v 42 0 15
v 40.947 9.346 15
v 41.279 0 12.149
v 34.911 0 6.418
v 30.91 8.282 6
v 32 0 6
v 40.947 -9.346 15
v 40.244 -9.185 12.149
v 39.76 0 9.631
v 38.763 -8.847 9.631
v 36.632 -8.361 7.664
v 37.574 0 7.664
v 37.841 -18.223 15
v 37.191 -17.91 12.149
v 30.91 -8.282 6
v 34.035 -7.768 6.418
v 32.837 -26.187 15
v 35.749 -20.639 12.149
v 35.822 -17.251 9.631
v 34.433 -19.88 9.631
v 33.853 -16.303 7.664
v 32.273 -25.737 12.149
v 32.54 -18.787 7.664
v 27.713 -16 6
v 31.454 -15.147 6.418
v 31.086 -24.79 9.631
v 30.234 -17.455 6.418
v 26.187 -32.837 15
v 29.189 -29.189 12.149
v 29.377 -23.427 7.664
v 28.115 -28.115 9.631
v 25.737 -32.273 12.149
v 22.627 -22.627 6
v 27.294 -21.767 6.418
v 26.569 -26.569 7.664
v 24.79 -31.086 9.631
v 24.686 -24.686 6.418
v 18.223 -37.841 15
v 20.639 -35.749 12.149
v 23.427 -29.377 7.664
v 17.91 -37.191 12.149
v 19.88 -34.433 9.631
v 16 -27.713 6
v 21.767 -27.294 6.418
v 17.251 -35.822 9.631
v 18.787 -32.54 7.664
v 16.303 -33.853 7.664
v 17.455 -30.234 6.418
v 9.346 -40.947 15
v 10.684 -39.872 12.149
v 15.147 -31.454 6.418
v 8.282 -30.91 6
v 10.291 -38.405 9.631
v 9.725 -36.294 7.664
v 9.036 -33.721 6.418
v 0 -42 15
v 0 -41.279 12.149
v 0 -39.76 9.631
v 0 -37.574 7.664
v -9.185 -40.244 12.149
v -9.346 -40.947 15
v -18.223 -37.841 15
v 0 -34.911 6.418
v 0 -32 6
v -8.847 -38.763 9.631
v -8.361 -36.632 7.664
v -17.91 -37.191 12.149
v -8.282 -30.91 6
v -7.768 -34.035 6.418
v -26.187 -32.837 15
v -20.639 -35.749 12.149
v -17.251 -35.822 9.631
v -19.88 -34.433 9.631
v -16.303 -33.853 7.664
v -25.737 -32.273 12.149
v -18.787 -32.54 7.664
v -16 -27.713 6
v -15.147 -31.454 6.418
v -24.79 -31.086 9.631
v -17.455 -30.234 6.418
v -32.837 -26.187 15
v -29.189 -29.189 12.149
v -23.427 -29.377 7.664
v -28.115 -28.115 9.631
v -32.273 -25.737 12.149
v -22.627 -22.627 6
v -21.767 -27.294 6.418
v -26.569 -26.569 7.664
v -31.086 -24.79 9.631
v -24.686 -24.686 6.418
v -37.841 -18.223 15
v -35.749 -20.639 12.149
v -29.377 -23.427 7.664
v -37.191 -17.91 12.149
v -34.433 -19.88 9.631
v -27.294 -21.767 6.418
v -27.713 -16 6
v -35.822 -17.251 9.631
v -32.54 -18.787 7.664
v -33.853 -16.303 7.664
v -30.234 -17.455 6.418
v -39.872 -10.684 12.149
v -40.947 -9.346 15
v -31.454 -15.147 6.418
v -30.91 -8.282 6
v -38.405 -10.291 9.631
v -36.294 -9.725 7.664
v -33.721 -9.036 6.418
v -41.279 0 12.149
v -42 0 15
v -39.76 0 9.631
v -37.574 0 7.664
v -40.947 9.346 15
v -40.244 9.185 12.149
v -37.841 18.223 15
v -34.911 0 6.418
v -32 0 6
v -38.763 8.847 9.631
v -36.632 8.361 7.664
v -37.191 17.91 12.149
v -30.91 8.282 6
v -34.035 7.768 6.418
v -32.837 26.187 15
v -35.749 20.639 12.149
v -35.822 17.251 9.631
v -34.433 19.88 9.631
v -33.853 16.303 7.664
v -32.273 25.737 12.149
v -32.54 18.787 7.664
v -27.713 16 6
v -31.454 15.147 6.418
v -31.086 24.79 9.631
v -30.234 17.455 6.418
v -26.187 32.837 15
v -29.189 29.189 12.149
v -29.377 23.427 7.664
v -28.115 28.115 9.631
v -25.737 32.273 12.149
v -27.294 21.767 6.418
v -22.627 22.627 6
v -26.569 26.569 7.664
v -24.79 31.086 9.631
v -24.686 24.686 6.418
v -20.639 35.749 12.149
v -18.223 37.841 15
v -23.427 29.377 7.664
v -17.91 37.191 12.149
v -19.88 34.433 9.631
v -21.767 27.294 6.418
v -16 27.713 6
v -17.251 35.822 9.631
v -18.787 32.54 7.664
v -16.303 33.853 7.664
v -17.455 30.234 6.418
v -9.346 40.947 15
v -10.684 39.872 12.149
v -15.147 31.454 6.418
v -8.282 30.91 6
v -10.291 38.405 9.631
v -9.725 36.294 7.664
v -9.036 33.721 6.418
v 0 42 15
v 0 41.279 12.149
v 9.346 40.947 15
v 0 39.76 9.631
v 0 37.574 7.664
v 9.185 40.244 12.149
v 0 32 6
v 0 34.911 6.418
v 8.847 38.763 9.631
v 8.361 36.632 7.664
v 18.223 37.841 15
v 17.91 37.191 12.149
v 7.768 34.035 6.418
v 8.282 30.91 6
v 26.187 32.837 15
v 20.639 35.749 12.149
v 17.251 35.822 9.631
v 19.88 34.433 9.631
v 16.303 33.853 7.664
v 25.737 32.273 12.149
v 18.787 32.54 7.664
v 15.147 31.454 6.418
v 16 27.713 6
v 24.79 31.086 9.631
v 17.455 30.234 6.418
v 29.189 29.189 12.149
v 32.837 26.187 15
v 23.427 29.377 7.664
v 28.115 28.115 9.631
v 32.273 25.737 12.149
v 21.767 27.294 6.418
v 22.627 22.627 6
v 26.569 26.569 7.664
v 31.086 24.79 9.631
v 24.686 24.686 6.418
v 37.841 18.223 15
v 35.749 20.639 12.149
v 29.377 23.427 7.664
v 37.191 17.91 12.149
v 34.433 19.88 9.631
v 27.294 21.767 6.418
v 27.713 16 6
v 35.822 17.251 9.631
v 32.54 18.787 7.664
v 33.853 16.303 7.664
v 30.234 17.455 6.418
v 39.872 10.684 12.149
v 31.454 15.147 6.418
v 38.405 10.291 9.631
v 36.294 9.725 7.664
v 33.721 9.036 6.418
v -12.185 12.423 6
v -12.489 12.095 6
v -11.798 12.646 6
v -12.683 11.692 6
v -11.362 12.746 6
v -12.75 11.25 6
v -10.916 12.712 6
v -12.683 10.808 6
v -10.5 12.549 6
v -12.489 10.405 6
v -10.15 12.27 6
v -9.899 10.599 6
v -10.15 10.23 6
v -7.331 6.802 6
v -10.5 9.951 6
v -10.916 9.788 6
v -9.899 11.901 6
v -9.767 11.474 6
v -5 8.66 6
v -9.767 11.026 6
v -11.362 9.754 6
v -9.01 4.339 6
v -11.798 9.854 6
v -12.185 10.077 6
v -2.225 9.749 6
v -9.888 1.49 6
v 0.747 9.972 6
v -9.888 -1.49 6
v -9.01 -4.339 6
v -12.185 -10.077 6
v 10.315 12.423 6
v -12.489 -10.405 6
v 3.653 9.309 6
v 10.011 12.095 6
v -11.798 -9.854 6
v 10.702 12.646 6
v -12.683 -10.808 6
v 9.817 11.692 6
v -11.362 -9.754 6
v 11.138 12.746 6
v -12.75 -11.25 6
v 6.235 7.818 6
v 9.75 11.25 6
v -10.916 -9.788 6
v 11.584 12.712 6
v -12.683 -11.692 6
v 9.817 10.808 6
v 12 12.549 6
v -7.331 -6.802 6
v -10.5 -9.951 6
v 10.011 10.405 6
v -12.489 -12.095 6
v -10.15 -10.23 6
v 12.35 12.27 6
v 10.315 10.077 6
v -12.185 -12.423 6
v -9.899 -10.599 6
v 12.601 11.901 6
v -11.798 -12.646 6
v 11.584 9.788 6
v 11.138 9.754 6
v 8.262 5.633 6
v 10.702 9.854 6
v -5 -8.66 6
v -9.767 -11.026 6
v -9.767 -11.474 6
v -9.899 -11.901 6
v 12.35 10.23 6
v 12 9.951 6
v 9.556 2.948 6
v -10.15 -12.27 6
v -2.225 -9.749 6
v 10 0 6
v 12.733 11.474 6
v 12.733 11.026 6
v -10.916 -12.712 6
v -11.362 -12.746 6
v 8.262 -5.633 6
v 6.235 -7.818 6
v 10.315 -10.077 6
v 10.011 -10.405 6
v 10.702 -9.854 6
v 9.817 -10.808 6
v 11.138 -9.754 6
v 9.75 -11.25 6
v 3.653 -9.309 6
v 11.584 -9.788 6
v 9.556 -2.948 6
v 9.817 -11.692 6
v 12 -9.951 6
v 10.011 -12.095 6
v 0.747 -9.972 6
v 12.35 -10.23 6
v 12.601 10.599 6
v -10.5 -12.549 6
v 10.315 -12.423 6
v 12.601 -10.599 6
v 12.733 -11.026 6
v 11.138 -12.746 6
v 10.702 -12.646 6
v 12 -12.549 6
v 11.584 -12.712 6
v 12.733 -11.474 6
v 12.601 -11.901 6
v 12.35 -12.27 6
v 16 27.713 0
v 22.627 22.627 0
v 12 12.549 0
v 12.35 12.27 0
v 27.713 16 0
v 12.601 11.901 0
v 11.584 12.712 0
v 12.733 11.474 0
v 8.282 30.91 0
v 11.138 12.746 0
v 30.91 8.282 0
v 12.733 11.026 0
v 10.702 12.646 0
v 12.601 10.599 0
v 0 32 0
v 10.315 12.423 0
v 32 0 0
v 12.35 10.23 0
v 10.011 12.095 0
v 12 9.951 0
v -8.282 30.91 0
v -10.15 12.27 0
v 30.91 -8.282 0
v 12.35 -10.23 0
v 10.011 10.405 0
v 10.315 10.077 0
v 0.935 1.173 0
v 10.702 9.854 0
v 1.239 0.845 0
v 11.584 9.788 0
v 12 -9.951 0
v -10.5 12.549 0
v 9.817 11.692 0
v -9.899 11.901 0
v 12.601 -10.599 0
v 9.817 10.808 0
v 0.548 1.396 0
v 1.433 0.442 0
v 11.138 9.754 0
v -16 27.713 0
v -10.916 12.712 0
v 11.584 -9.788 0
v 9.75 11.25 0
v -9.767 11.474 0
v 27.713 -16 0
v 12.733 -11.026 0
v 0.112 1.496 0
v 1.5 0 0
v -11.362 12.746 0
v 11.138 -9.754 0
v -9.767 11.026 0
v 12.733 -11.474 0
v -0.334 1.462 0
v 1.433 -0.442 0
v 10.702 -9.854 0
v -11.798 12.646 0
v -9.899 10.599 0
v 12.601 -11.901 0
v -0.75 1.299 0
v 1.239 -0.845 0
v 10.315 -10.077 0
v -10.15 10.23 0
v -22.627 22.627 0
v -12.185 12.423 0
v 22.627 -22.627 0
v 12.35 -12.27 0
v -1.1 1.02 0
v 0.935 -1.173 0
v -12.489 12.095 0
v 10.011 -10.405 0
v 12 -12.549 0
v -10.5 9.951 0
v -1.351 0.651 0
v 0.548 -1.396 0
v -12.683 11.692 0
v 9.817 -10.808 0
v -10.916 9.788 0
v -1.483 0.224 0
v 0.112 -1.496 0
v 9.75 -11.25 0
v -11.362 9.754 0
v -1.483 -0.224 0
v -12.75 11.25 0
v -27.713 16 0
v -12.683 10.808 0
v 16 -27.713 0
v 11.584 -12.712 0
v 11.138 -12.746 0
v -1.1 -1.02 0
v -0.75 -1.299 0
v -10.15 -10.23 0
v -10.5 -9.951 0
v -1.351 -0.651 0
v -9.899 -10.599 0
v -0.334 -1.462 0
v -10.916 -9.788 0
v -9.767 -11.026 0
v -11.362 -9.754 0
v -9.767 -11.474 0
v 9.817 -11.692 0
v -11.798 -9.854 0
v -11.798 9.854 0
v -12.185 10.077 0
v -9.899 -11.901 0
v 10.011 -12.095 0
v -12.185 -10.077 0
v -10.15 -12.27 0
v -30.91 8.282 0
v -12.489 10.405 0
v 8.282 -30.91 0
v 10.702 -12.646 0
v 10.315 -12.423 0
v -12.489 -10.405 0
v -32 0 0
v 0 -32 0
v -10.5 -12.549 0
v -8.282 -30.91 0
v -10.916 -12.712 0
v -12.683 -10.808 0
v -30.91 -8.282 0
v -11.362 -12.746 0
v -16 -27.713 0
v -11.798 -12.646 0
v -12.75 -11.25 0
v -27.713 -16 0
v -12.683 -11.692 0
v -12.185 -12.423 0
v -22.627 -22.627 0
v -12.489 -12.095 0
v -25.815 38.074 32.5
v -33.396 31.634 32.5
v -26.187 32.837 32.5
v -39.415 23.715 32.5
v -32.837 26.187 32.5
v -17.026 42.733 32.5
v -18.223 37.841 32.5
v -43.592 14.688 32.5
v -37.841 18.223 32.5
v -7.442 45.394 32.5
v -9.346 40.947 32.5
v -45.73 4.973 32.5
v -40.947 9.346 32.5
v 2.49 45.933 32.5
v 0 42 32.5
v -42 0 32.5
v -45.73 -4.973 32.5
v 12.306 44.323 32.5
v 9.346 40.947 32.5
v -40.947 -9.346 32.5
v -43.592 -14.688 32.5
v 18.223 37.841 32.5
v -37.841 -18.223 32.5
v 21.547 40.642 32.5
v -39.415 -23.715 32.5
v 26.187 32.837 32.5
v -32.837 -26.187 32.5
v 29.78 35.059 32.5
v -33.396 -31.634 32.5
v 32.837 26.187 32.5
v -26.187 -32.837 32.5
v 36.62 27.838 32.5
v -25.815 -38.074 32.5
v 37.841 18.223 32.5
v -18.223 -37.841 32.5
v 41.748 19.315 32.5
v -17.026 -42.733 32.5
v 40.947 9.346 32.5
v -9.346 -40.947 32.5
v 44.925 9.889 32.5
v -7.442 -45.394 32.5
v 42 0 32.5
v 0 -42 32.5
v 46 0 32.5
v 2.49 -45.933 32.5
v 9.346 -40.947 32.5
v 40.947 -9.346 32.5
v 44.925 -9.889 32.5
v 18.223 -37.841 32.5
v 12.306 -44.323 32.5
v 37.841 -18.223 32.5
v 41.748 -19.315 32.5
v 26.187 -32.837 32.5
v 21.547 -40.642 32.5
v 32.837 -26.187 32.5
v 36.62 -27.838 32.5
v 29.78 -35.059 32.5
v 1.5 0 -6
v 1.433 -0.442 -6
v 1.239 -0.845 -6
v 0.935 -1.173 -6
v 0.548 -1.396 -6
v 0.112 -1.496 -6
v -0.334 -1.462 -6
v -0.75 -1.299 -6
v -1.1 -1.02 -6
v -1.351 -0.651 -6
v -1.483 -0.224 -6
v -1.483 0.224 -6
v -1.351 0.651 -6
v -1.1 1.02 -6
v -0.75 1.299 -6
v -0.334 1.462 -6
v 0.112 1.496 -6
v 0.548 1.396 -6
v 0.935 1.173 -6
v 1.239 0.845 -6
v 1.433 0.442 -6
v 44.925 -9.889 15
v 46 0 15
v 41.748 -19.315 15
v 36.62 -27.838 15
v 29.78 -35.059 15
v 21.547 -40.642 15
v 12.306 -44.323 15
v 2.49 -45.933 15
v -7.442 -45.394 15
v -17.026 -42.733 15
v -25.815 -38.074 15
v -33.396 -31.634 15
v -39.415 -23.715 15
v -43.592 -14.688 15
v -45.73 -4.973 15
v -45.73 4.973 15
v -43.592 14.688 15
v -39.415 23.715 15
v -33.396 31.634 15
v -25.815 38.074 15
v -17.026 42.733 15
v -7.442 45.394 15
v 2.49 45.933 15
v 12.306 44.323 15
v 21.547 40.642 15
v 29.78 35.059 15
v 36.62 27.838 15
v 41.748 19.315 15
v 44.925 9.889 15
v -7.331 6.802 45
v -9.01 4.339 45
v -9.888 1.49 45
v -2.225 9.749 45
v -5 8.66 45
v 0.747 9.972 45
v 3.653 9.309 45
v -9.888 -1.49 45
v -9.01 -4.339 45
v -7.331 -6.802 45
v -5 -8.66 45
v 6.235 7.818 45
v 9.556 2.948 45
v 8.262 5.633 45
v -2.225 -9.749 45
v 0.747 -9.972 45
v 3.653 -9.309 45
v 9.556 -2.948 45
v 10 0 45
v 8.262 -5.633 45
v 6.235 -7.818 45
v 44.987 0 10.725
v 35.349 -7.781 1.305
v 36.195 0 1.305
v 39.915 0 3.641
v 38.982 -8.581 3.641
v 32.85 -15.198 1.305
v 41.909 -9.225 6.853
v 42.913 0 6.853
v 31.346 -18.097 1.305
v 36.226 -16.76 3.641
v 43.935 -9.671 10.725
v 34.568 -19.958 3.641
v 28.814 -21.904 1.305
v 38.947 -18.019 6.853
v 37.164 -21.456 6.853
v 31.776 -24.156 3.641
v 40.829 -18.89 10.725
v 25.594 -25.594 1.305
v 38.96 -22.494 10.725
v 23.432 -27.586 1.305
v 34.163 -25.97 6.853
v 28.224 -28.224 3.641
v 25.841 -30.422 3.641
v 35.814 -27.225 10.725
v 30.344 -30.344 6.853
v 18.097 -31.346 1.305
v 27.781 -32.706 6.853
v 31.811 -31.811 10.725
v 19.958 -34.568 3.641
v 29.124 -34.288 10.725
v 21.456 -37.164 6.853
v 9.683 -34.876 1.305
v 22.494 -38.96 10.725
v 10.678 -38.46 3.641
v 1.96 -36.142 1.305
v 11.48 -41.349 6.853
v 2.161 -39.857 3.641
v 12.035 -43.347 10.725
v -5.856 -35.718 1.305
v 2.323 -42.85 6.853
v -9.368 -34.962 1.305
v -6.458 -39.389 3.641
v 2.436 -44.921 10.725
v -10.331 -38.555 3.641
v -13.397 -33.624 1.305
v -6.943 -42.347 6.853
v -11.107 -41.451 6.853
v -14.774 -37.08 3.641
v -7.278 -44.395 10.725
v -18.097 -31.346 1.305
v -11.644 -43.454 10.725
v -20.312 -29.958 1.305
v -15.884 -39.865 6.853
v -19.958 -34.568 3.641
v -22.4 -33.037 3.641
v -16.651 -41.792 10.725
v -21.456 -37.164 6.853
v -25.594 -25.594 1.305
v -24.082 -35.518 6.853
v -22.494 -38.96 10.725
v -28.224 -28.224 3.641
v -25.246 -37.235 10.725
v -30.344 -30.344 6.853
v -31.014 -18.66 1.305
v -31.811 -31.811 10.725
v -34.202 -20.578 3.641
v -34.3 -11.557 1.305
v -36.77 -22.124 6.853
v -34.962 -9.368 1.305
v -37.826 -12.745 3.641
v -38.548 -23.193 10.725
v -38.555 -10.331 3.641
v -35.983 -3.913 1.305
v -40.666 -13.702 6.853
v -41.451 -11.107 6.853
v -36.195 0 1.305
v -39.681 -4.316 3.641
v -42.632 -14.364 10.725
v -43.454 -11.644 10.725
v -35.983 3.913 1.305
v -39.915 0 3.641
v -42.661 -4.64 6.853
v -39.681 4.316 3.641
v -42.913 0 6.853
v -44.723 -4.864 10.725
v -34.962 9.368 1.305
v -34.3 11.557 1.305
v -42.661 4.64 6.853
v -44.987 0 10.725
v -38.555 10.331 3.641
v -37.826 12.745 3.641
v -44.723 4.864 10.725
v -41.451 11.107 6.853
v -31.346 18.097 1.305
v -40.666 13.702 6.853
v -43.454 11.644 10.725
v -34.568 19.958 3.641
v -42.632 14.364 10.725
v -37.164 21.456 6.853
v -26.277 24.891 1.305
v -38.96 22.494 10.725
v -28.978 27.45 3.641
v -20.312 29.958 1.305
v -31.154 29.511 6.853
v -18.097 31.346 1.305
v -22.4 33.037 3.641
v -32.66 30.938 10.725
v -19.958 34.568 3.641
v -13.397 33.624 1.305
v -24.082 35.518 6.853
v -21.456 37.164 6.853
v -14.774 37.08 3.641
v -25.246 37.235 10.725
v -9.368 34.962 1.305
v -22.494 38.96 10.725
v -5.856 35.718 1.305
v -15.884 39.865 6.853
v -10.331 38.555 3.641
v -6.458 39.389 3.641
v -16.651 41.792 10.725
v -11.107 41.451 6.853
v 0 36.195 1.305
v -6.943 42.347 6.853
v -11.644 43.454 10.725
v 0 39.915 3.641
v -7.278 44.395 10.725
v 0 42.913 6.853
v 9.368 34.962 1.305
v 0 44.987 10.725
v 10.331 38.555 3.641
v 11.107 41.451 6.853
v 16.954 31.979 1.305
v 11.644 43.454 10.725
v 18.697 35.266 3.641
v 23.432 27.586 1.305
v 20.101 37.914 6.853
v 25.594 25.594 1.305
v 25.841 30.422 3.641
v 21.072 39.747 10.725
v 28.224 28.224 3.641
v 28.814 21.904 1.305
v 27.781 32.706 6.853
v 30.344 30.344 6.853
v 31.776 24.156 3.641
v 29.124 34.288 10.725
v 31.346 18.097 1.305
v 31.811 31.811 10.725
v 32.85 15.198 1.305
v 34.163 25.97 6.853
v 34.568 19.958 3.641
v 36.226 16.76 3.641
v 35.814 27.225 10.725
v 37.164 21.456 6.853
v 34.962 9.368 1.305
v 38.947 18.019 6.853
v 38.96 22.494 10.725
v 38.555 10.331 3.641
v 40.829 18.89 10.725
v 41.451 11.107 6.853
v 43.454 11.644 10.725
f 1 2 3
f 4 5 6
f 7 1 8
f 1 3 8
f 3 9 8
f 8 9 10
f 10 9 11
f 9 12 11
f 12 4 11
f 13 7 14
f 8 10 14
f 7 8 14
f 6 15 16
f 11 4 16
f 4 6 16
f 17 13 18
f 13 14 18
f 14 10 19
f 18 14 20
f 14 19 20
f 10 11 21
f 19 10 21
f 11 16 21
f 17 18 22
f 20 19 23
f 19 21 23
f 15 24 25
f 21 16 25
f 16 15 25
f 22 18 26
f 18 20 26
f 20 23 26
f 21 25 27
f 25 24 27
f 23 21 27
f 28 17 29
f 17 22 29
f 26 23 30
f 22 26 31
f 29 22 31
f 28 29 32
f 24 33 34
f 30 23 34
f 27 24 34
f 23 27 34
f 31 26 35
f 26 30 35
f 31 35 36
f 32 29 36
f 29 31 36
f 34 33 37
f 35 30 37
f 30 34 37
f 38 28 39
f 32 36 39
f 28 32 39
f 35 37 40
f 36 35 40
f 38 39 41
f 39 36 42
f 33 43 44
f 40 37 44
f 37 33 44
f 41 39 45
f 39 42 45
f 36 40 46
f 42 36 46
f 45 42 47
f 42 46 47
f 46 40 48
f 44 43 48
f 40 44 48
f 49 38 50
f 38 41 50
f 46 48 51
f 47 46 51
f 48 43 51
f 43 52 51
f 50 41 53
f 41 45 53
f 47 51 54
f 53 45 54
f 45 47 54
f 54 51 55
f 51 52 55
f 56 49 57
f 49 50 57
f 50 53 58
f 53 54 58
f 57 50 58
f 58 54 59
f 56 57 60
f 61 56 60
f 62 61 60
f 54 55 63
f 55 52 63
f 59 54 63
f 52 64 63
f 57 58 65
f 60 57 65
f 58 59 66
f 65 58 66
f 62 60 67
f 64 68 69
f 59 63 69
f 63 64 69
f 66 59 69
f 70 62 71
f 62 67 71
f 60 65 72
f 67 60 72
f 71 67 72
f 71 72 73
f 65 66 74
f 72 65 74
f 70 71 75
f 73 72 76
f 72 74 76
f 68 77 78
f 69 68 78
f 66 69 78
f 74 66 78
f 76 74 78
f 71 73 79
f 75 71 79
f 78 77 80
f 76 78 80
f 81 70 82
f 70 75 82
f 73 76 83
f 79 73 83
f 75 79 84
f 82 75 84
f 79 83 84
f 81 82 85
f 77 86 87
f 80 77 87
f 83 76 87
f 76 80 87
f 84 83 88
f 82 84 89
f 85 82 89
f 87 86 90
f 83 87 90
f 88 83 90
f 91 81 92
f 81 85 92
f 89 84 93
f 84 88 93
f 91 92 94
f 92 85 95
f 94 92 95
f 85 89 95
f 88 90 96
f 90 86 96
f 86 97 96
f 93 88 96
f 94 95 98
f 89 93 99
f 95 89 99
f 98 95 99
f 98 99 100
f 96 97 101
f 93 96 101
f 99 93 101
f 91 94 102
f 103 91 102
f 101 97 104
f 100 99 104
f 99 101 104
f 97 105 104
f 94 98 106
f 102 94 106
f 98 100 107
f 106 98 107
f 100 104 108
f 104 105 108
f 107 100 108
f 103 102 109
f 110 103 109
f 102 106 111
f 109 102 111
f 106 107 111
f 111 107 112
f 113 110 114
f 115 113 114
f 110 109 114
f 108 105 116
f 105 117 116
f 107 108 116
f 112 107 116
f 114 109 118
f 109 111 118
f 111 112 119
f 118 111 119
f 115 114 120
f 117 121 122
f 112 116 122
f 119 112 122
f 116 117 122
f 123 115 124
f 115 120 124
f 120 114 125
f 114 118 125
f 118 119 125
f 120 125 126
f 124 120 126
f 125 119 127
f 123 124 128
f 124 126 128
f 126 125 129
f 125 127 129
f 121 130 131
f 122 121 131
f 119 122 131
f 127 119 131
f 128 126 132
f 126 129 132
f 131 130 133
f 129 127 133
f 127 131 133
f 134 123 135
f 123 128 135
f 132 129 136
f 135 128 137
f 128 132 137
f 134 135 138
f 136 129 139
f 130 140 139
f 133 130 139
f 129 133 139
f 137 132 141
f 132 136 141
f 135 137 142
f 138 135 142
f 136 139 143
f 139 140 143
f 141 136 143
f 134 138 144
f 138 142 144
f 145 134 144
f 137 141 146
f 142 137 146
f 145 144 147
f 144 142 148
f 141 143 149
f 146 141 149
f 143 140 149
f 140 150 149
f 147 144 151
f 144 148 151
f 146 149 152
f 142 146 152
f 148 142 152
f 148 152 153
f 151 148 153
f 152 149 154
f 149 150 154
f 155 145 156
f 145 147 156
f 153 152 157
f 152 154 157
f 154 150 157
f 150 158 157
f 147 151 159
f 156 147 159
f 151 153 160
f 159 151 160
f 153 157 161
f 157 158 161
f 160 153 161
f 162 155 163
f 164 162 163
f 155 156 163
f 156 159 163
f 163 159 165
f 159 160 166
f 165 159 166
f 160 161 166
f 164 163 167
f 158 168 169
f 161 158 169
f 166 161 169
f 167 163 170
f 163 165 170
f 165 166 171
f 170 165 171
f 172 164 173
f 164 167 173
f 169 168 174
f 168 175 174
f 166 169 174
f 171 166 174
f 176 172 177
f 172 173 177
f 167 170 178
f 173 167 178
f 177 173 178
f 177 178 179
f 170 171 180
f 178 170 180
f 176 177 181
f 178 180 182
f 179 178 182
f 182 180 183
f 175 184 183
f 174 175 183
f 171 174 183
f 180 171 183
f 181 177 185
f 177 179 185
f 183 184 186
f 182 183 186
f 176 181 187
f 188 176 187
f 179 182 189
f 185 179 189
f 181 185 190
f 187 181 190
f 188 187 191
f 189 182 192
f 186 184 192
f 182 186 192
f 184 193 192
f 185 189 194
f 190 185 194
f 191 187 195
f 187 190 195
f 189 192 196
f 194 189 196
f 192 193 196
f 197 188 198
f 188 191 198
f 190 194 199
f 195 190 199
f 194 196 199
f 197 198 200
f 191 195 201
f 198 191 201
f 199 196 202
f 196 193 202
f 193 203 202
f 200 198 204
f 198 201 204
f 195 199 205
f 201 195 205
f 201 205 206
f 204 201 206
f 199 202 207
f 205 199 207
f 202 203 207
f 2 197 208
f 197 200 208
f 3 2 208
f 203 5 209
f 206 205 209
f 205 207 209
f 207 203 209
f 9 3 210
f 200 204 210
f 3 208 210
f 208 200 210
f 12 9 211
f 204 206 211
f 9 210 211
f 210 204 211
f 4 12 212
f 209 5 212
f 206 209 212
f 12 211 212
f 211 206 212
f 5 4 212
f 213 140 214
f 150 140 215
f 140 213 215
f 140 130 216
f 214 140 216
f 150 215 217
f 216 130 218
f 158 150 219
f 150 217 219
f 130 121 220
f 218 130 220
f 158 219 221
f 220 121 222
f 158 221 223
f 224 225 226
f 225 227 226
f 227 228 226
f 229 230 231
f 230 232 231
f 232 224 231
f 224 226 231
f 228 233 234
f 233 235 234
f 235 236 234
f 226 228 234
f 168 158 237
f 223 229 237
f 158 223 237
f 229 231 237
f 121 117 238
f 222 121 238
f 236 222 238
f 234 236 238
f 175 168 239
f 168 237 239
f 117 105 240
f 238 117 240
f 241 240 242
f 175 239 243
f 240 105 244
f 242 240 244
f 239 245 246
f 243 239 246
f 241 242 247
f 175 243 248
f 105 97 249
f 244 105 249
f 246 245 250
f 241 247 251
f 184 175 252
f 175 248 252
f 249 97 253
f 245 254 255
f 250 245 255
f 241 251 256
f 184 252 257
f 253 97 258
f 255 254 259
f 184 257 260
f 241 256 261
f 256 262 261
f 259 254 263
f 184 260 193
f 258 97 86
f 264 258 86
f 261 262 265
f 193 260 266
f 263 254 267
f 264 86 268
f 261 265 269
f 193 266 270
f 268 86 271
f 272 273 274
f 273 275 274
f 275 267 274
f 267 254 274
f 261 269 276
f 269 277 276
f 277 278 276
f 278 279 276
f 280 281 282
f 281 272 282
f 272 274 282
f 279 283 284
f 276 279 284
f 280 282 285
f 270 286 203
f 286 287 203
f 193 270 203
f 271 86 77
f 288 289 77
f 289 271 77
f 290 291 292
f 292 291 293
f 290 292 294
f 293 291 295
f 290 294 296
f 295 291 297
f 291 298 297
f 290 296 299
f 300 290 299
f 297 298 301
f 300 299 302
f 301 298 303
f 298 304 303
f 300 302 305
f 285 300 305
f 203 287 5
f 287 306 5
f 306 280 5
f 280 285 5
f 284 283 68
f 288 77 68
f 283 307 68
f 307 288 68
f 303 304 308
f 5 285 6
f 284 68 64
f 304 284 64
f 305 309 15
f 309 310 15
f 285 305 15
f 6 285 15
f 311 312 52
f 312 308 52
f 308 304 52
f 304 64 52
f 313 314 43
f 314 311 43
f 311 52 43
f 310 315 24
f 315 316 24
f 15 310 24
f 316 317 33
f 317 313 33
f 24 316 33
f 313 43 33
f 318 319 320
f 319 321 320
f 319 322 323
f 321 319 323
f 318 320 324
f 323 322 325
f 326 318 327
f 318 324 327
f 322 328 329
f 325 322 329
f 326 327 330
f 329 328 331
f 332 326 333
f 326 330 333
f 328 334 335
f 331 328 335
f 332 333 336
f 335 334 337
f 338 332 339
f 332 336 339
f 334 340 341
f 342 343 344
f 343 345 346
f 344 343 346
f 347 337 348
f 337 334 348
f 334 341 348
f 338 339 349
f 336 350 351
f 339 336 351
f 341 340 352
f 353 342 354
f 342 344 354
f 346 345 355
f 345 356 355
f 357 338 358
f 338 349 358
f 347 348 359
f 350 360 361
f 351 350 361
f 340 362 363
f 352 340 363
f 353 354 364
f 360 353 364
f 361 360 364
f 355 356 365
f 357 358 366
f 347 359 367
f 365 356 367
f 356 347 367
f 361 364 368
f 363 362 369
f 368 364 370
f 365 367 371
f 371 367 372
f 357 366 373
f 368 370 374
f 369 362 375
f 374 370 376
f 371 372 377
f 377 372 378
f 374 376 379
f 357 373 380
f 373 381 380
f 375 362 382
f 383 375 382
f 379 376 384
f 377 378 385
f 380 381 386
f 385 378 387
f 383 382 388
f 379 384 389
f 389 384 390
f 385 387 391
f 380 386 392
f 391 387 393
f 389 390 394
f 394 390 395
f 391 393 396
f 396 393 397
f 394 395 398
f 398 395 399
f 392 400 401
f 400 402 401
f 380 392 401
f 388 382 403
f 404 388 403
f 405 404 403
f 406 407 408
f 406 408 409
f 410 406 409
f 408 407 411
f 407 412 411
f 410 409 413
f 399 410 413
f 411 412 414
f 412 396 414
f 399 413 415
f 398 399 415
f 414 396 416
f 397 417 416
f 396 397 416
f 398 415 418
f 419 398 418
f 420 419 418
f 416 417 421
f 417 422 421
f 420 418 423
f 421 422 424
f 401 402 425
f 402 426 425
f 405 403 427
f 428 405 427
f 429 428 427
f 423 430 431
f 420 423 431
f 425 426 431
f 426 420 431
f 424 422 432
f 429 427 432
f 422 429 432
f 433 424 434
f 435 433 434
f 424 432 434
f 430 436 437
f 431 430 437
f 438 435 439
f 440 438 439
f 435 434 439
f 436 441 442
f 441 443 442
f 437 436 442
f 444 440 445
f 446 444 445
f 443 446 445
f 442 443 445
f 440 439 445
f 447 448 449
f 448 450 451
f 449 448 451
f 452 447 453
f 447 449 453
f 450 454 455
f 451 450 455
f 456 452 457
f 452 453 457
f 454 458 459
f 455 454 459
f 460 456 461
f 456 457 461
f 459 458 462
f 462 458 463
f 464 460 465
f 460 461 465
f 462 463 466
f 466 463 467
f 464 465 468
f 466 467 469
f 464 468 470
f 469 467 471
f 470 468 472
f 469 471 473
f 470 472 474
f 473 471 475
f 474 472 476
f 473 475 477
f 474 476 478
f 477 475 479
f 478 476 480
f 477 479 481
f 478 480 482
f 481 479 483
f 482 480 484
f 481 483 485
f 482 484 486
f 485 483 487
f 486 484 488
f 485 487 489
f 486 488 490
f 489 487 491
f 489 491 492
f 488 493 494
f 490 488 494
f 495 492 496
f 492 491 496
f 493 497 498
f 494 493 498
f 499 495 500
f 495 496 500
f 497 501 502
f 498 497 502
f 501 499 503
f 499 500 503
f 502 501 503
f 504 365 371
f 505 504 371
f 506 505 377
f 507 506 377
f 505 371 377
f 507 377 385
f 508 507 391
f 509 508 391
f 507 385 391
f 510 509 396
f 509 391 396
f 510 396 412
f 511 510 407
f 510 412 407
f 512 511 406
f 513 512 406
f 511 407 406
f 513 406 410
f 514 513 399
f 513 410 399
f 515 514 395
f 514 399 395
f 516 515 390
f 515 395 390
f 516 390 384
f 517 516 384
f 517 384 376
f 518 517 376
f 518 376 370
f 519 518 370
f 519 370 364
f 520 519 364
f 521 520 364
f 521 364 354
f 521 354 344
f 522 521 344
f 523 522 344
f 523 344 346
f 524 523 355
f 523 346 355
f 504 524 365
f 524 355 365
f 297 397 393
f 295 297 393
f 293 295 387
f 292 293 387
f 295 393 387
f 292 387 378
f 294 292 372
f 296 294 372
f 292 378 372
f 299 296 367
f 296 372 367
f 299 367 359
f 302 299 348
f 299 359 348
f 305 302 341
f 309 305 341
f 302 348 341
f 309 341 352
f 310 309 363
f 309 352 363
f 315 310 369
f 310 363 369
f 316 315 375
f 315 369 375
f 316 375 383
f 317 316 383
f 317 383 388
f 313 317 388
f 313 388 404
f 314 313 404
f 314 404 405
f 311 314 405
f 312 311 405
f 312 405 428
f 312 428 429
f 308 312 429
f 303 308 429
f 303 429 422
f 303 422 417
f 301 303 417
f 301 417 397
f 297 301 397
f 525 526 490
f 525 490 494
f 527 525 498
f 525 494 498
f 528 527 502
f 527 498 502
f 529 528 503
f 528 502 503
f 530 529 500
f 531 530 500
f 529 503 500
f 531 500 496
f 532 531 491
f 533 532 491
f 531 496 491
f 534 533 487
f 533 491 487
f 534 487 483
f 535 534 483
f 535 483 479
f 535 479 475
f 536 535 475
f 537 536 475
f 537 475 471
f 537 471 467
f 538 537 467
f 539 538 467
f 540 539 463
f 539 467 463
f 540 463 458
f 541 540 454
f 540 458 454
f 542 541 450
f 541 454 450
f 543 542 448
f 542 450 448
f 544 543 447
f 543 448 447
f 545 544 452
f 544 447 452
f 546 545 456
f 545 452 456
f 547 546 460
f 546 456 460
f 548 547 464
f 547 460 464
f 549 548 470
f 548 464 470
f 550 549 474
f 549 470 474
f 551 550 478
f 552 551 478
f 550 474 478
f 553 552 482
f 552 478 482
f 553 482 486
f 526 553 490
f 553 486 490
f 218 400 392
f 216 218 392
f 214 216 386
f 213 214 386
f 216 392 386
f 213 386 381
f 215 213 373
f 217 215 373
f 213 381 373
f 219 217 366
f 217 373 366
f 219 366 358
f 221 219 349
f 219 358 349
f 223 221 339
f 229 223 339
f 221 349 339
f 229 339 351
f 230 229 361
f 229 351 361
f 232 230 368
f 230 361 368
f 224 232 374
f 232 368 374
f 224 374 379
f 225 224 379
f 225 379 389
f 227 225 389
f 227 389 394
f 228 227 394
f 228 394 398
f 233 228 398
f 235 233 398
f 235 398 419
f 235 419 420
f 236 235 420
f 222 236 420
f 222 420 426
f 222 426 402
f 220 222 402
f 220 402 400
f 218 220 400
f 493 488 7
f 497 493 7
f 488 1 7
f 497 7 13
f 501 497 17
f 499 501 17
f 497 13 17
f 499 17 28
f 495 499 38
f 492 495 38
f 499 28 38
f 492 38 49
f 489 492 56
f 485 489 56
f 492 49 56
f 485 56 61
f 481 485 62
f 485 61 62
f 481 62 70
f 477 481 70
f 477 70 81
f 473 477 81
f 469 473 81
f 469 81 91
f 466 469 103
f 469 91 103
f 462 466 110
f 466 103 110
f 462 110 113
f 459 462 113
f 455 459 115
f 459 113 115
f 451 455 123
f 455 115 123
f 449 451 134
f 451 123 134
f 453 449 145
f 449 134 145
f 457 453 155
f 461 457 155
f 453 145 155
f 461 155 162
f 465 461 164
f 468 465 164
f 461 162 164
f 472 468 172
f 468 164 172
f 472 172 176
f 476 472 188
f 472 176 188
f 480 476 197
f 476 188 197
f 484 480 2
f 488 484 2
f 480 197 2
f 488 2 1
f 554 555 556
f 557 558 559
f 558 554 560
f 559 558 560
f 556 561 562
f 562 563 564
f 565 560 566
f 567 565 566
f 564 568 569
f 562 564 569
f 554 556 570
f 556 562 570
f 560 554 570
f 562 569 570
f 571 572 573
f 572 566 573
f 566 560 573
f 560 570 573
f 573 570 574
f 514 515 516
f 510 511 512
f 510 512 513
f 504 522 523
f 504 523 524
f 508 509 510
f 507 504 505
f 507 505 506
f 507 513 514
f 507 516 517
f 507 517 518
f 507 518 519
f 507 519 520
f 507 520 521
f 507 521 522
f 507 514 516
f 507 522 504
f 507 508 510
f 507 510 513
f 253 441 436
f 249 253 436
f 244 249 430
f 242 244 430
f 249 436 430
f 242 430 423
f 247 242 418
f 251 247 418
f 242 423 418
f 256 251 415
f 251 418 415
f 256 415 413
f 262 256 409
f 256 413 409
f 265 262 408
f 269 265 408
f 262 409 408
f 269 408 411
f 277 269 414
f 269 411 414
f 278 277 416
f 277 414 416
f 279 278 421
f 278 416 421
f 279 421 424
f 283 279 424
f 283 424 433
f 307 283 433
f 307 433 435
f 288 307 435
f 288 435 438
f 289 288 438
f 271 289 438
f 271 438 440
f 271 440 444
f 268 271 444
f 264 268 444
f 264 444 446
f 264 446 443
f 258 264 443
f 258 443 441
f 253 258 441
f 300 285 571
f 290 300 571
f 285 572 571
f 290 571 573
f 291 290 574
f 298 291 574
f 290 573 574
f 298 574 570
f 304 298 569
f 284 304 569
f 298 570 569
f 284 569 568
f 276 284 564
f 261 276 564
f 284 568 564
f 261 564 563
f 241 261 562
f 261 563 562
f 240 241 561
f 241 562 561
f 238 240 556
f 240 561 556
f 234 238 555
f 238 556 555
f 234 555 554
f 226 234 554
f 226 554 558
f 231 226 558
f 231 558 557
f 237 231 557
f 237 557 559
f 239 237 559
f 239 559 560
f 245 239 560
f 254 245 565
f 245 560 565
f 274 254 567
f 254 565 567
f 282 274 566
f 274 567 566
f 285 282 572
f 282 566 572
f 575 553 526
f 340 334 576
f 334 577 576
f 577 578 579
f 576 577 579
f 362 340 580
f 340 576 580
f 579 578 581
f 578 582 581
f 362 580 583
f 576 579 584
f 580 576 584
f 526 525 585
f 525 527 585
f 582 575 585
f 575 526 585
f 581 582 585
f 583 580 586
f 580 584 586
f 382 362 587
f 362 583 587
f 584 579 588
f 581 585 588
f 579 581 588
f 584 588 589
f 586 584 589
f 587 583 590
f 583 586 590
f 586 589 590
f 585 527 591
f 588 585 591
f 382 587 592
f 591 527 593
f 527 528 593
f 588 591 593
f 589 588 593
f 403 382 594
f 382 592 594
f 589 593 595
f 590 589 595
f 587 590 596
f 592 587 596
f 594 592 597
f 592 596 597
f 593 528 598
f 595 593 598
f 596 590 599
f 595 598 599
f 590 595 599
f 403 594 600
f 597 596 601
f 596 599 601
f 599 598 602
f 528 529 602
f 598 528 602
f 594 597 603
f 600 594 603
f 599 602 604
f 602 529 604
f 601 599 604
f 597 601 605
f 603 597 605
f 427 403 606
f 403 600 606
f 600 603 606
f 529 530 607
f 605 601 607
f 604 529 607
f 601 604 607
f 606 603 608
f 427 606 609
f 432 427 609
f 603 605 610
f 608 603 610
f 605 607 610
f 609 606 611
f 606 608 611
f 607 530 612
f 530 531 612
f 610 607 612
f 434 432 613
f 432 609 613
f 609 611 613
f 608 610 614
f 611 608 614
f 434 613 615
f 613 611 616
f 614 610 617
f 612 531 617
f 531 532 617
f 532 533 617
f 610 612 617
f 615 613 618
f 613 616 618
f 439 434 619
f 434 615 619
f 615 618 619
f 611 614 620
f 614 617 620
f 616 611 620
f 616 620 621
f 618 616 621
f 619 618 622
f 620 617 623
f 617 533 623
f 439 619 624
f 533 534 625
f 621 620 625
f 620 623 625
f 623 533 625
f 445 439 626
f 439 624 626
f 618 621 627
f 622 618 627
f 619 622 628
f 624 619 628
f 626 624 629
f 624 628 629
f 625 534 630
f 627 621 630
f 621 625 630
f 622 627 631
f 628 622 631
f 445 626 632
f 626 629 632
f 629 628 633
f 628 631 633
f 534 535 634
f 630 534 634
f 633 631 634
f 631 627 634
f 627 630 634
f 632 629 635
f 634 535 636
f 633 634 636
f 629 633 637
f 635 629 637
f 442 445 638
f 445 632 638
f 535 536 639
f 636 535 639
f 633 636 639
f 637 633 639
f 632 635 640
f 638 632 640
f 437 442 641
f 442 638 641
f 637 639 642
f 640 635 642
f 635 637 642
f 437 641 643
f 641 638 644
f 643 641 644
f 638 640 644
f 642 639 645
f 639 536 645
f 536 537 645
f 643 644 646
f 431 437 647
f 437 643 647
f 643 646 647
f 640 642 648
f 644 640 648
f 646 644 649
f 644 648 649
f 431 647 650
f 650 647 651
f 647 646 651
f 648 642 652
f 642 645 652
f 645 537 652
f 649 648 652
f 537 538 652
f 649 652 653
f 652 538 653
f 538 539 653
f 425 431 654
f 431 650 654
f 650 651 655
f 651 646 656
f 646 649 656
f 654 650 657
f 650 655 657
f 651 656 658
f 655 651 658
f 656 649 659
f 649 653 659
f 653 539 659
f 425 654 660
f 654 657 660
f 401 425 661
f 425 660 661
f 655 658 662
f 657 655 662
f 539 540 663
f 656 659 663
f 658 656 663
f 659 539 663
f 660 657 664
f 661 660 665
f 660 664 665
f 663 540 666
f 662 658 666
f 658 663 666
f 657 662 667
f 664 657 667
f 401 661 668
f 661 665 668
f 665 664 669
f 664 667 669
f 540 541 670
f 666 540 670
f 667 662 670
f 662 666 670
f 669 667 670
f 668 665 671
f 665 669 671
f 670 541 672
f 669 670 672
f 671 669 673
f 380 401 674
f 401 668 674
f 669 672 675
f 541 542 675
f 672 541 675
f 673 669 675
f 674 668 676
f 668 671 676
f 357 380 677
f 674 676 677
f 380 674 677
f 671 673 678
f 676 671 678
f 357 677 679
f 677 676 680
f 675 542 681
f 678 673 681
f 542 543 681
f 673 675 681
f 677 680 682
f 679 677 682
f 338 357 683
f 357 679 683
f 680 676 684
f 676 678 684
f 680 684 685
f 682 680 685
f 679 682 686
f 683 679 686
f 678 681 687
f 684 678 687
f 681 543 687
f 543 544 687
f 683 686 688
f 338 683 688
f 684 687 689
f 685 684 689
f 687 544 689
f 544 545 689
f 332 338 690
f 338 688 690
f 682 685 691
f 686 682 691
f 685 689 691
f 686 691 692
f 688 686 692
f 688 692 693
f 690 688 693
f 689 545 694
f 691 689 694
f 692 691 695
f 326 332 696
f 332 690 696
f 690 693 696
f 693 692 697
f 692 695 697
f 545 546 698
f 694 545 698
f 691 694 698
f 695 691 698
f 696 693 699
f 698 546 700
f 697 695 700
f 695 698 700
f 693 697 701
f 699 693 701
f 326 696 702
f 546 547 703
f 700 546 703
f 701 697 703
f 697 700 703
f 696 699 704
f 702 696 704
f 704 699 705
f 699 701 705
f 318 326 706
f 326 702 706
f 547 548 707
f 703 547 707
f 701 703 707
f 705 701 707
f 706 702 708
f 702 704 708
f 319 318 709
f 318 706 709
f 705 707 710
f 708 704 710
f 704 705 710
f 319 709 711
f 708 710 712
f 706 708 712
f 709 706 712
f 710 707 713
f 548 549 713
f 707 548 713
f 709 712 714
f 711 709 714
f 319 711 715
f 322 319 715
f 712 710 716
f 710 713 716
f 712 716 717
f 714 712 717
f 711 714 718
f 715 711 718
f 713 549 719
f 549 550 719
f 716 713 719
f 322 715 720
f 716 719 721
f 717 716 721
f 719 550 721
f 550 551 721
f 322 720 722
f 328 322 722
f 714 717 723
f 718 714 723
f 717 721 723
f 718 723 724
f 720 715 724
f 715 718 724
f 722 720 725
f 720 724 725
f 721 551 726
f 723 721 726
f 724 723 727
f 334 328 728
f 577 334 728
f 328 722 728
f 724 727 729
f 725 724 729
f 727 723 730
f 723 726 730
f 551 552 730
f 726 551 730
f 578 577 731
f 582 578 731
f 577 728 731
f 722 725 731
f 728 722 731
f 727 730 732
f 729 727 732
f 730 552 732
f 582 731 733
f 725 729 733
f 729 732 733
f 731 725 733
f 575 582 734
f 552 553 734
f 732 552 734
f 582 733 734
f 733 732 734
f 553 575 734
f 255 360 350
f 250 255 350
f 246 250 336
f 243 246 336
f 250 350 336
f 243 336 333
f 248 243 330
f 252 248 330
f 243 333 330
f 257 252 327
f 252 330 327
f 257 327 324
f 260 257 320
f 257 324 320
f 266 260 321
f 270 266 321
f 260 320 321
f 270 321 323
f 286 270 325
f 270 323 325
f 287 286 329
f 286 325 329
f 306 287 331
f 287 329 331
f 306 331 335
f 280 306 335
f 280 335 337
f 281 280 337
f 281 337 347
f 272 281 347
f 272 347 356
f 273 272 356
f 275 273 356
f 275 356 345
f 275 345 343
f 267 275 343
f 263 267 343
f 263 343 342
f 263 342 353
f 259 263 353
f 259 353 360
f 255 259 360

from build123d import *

# Parameters (mm, degrees)
SKETCH3_R            = 1.5
FIXATION_HOLES_DEPTH = 80.101201002
SKETCH4_R            = 1.5
SHAFT_DEPTH          = 6


with BuildPart() as part:
    # Sketch2 → Body (revolve)
    with BuildSketch(Plane(origin=(0, 0, 0), x_dir=(0, 0, -1), z_dir=(1, 0, 0)), mode=Mode.PRIVATE) as body_sk:
        with BuildLine():
            Line((0, 0), (0, 32))
            ThreePointArc((0, 32), (-5.149715015, 41.518162483), (-15, 46))
            Line((-15, 46), (-32.5, 46))
            Line((-32.5, 46), (-32.5, 42))
            Line((-32.5, 42), (-15, 42))
            ThreePointArc((-15, 42), (-8.566932971, 38.739760326), (-6, 32))
            Line((-6, 32), (-6, 10))
            Line((-6, 10), (-45, 10))
            Line((-45, 10), (-45, 0))
            Line((-45, 0), (0, 0))
        make_face()
    revolve(body_sk.sketch.rotate(Axis((0, 0, 677.96312991), (0, 0, -1)), 90), axis=Axis((0, 0, 677.96312991), (0, 0, -1)))

    # Sketch3 → Fixation_Holes (cut, through all)
    with BuildSketch(Plane(origin=(0, 0, 0), x_dir=(-1, 0, 0), z_dir=(0, 0, -1))):
        with Locations((-11.25, 11.25)):
            Circle(SKETCH3_R)
        with Locations((11.25, 11.25)):
            Circle(SKETCH3_R)
        with Locations((11.25, -11.25)):
            Circle(SKETCH3_R)
        with Locations((-11.25, -11.25)):
            Circle(SKETCH3_R)
    extrude(amount=-FIXATION_HOLES_DEPTH, mode=Mode.SUBTRACT)

    # Sketch4 → Shaft (add)
    with BuildSketch(Plane(origin=(0, 0, 0), x_dir=(-1, 0, 0), z_dir=(0, 0, -1))):
        with Locations(Location((0, 0, 0), (0, 0, 180))):
            Circle(SKETCH4_R)
    extrude(amount=SHAFT_DEPTH)


solid = part.part
